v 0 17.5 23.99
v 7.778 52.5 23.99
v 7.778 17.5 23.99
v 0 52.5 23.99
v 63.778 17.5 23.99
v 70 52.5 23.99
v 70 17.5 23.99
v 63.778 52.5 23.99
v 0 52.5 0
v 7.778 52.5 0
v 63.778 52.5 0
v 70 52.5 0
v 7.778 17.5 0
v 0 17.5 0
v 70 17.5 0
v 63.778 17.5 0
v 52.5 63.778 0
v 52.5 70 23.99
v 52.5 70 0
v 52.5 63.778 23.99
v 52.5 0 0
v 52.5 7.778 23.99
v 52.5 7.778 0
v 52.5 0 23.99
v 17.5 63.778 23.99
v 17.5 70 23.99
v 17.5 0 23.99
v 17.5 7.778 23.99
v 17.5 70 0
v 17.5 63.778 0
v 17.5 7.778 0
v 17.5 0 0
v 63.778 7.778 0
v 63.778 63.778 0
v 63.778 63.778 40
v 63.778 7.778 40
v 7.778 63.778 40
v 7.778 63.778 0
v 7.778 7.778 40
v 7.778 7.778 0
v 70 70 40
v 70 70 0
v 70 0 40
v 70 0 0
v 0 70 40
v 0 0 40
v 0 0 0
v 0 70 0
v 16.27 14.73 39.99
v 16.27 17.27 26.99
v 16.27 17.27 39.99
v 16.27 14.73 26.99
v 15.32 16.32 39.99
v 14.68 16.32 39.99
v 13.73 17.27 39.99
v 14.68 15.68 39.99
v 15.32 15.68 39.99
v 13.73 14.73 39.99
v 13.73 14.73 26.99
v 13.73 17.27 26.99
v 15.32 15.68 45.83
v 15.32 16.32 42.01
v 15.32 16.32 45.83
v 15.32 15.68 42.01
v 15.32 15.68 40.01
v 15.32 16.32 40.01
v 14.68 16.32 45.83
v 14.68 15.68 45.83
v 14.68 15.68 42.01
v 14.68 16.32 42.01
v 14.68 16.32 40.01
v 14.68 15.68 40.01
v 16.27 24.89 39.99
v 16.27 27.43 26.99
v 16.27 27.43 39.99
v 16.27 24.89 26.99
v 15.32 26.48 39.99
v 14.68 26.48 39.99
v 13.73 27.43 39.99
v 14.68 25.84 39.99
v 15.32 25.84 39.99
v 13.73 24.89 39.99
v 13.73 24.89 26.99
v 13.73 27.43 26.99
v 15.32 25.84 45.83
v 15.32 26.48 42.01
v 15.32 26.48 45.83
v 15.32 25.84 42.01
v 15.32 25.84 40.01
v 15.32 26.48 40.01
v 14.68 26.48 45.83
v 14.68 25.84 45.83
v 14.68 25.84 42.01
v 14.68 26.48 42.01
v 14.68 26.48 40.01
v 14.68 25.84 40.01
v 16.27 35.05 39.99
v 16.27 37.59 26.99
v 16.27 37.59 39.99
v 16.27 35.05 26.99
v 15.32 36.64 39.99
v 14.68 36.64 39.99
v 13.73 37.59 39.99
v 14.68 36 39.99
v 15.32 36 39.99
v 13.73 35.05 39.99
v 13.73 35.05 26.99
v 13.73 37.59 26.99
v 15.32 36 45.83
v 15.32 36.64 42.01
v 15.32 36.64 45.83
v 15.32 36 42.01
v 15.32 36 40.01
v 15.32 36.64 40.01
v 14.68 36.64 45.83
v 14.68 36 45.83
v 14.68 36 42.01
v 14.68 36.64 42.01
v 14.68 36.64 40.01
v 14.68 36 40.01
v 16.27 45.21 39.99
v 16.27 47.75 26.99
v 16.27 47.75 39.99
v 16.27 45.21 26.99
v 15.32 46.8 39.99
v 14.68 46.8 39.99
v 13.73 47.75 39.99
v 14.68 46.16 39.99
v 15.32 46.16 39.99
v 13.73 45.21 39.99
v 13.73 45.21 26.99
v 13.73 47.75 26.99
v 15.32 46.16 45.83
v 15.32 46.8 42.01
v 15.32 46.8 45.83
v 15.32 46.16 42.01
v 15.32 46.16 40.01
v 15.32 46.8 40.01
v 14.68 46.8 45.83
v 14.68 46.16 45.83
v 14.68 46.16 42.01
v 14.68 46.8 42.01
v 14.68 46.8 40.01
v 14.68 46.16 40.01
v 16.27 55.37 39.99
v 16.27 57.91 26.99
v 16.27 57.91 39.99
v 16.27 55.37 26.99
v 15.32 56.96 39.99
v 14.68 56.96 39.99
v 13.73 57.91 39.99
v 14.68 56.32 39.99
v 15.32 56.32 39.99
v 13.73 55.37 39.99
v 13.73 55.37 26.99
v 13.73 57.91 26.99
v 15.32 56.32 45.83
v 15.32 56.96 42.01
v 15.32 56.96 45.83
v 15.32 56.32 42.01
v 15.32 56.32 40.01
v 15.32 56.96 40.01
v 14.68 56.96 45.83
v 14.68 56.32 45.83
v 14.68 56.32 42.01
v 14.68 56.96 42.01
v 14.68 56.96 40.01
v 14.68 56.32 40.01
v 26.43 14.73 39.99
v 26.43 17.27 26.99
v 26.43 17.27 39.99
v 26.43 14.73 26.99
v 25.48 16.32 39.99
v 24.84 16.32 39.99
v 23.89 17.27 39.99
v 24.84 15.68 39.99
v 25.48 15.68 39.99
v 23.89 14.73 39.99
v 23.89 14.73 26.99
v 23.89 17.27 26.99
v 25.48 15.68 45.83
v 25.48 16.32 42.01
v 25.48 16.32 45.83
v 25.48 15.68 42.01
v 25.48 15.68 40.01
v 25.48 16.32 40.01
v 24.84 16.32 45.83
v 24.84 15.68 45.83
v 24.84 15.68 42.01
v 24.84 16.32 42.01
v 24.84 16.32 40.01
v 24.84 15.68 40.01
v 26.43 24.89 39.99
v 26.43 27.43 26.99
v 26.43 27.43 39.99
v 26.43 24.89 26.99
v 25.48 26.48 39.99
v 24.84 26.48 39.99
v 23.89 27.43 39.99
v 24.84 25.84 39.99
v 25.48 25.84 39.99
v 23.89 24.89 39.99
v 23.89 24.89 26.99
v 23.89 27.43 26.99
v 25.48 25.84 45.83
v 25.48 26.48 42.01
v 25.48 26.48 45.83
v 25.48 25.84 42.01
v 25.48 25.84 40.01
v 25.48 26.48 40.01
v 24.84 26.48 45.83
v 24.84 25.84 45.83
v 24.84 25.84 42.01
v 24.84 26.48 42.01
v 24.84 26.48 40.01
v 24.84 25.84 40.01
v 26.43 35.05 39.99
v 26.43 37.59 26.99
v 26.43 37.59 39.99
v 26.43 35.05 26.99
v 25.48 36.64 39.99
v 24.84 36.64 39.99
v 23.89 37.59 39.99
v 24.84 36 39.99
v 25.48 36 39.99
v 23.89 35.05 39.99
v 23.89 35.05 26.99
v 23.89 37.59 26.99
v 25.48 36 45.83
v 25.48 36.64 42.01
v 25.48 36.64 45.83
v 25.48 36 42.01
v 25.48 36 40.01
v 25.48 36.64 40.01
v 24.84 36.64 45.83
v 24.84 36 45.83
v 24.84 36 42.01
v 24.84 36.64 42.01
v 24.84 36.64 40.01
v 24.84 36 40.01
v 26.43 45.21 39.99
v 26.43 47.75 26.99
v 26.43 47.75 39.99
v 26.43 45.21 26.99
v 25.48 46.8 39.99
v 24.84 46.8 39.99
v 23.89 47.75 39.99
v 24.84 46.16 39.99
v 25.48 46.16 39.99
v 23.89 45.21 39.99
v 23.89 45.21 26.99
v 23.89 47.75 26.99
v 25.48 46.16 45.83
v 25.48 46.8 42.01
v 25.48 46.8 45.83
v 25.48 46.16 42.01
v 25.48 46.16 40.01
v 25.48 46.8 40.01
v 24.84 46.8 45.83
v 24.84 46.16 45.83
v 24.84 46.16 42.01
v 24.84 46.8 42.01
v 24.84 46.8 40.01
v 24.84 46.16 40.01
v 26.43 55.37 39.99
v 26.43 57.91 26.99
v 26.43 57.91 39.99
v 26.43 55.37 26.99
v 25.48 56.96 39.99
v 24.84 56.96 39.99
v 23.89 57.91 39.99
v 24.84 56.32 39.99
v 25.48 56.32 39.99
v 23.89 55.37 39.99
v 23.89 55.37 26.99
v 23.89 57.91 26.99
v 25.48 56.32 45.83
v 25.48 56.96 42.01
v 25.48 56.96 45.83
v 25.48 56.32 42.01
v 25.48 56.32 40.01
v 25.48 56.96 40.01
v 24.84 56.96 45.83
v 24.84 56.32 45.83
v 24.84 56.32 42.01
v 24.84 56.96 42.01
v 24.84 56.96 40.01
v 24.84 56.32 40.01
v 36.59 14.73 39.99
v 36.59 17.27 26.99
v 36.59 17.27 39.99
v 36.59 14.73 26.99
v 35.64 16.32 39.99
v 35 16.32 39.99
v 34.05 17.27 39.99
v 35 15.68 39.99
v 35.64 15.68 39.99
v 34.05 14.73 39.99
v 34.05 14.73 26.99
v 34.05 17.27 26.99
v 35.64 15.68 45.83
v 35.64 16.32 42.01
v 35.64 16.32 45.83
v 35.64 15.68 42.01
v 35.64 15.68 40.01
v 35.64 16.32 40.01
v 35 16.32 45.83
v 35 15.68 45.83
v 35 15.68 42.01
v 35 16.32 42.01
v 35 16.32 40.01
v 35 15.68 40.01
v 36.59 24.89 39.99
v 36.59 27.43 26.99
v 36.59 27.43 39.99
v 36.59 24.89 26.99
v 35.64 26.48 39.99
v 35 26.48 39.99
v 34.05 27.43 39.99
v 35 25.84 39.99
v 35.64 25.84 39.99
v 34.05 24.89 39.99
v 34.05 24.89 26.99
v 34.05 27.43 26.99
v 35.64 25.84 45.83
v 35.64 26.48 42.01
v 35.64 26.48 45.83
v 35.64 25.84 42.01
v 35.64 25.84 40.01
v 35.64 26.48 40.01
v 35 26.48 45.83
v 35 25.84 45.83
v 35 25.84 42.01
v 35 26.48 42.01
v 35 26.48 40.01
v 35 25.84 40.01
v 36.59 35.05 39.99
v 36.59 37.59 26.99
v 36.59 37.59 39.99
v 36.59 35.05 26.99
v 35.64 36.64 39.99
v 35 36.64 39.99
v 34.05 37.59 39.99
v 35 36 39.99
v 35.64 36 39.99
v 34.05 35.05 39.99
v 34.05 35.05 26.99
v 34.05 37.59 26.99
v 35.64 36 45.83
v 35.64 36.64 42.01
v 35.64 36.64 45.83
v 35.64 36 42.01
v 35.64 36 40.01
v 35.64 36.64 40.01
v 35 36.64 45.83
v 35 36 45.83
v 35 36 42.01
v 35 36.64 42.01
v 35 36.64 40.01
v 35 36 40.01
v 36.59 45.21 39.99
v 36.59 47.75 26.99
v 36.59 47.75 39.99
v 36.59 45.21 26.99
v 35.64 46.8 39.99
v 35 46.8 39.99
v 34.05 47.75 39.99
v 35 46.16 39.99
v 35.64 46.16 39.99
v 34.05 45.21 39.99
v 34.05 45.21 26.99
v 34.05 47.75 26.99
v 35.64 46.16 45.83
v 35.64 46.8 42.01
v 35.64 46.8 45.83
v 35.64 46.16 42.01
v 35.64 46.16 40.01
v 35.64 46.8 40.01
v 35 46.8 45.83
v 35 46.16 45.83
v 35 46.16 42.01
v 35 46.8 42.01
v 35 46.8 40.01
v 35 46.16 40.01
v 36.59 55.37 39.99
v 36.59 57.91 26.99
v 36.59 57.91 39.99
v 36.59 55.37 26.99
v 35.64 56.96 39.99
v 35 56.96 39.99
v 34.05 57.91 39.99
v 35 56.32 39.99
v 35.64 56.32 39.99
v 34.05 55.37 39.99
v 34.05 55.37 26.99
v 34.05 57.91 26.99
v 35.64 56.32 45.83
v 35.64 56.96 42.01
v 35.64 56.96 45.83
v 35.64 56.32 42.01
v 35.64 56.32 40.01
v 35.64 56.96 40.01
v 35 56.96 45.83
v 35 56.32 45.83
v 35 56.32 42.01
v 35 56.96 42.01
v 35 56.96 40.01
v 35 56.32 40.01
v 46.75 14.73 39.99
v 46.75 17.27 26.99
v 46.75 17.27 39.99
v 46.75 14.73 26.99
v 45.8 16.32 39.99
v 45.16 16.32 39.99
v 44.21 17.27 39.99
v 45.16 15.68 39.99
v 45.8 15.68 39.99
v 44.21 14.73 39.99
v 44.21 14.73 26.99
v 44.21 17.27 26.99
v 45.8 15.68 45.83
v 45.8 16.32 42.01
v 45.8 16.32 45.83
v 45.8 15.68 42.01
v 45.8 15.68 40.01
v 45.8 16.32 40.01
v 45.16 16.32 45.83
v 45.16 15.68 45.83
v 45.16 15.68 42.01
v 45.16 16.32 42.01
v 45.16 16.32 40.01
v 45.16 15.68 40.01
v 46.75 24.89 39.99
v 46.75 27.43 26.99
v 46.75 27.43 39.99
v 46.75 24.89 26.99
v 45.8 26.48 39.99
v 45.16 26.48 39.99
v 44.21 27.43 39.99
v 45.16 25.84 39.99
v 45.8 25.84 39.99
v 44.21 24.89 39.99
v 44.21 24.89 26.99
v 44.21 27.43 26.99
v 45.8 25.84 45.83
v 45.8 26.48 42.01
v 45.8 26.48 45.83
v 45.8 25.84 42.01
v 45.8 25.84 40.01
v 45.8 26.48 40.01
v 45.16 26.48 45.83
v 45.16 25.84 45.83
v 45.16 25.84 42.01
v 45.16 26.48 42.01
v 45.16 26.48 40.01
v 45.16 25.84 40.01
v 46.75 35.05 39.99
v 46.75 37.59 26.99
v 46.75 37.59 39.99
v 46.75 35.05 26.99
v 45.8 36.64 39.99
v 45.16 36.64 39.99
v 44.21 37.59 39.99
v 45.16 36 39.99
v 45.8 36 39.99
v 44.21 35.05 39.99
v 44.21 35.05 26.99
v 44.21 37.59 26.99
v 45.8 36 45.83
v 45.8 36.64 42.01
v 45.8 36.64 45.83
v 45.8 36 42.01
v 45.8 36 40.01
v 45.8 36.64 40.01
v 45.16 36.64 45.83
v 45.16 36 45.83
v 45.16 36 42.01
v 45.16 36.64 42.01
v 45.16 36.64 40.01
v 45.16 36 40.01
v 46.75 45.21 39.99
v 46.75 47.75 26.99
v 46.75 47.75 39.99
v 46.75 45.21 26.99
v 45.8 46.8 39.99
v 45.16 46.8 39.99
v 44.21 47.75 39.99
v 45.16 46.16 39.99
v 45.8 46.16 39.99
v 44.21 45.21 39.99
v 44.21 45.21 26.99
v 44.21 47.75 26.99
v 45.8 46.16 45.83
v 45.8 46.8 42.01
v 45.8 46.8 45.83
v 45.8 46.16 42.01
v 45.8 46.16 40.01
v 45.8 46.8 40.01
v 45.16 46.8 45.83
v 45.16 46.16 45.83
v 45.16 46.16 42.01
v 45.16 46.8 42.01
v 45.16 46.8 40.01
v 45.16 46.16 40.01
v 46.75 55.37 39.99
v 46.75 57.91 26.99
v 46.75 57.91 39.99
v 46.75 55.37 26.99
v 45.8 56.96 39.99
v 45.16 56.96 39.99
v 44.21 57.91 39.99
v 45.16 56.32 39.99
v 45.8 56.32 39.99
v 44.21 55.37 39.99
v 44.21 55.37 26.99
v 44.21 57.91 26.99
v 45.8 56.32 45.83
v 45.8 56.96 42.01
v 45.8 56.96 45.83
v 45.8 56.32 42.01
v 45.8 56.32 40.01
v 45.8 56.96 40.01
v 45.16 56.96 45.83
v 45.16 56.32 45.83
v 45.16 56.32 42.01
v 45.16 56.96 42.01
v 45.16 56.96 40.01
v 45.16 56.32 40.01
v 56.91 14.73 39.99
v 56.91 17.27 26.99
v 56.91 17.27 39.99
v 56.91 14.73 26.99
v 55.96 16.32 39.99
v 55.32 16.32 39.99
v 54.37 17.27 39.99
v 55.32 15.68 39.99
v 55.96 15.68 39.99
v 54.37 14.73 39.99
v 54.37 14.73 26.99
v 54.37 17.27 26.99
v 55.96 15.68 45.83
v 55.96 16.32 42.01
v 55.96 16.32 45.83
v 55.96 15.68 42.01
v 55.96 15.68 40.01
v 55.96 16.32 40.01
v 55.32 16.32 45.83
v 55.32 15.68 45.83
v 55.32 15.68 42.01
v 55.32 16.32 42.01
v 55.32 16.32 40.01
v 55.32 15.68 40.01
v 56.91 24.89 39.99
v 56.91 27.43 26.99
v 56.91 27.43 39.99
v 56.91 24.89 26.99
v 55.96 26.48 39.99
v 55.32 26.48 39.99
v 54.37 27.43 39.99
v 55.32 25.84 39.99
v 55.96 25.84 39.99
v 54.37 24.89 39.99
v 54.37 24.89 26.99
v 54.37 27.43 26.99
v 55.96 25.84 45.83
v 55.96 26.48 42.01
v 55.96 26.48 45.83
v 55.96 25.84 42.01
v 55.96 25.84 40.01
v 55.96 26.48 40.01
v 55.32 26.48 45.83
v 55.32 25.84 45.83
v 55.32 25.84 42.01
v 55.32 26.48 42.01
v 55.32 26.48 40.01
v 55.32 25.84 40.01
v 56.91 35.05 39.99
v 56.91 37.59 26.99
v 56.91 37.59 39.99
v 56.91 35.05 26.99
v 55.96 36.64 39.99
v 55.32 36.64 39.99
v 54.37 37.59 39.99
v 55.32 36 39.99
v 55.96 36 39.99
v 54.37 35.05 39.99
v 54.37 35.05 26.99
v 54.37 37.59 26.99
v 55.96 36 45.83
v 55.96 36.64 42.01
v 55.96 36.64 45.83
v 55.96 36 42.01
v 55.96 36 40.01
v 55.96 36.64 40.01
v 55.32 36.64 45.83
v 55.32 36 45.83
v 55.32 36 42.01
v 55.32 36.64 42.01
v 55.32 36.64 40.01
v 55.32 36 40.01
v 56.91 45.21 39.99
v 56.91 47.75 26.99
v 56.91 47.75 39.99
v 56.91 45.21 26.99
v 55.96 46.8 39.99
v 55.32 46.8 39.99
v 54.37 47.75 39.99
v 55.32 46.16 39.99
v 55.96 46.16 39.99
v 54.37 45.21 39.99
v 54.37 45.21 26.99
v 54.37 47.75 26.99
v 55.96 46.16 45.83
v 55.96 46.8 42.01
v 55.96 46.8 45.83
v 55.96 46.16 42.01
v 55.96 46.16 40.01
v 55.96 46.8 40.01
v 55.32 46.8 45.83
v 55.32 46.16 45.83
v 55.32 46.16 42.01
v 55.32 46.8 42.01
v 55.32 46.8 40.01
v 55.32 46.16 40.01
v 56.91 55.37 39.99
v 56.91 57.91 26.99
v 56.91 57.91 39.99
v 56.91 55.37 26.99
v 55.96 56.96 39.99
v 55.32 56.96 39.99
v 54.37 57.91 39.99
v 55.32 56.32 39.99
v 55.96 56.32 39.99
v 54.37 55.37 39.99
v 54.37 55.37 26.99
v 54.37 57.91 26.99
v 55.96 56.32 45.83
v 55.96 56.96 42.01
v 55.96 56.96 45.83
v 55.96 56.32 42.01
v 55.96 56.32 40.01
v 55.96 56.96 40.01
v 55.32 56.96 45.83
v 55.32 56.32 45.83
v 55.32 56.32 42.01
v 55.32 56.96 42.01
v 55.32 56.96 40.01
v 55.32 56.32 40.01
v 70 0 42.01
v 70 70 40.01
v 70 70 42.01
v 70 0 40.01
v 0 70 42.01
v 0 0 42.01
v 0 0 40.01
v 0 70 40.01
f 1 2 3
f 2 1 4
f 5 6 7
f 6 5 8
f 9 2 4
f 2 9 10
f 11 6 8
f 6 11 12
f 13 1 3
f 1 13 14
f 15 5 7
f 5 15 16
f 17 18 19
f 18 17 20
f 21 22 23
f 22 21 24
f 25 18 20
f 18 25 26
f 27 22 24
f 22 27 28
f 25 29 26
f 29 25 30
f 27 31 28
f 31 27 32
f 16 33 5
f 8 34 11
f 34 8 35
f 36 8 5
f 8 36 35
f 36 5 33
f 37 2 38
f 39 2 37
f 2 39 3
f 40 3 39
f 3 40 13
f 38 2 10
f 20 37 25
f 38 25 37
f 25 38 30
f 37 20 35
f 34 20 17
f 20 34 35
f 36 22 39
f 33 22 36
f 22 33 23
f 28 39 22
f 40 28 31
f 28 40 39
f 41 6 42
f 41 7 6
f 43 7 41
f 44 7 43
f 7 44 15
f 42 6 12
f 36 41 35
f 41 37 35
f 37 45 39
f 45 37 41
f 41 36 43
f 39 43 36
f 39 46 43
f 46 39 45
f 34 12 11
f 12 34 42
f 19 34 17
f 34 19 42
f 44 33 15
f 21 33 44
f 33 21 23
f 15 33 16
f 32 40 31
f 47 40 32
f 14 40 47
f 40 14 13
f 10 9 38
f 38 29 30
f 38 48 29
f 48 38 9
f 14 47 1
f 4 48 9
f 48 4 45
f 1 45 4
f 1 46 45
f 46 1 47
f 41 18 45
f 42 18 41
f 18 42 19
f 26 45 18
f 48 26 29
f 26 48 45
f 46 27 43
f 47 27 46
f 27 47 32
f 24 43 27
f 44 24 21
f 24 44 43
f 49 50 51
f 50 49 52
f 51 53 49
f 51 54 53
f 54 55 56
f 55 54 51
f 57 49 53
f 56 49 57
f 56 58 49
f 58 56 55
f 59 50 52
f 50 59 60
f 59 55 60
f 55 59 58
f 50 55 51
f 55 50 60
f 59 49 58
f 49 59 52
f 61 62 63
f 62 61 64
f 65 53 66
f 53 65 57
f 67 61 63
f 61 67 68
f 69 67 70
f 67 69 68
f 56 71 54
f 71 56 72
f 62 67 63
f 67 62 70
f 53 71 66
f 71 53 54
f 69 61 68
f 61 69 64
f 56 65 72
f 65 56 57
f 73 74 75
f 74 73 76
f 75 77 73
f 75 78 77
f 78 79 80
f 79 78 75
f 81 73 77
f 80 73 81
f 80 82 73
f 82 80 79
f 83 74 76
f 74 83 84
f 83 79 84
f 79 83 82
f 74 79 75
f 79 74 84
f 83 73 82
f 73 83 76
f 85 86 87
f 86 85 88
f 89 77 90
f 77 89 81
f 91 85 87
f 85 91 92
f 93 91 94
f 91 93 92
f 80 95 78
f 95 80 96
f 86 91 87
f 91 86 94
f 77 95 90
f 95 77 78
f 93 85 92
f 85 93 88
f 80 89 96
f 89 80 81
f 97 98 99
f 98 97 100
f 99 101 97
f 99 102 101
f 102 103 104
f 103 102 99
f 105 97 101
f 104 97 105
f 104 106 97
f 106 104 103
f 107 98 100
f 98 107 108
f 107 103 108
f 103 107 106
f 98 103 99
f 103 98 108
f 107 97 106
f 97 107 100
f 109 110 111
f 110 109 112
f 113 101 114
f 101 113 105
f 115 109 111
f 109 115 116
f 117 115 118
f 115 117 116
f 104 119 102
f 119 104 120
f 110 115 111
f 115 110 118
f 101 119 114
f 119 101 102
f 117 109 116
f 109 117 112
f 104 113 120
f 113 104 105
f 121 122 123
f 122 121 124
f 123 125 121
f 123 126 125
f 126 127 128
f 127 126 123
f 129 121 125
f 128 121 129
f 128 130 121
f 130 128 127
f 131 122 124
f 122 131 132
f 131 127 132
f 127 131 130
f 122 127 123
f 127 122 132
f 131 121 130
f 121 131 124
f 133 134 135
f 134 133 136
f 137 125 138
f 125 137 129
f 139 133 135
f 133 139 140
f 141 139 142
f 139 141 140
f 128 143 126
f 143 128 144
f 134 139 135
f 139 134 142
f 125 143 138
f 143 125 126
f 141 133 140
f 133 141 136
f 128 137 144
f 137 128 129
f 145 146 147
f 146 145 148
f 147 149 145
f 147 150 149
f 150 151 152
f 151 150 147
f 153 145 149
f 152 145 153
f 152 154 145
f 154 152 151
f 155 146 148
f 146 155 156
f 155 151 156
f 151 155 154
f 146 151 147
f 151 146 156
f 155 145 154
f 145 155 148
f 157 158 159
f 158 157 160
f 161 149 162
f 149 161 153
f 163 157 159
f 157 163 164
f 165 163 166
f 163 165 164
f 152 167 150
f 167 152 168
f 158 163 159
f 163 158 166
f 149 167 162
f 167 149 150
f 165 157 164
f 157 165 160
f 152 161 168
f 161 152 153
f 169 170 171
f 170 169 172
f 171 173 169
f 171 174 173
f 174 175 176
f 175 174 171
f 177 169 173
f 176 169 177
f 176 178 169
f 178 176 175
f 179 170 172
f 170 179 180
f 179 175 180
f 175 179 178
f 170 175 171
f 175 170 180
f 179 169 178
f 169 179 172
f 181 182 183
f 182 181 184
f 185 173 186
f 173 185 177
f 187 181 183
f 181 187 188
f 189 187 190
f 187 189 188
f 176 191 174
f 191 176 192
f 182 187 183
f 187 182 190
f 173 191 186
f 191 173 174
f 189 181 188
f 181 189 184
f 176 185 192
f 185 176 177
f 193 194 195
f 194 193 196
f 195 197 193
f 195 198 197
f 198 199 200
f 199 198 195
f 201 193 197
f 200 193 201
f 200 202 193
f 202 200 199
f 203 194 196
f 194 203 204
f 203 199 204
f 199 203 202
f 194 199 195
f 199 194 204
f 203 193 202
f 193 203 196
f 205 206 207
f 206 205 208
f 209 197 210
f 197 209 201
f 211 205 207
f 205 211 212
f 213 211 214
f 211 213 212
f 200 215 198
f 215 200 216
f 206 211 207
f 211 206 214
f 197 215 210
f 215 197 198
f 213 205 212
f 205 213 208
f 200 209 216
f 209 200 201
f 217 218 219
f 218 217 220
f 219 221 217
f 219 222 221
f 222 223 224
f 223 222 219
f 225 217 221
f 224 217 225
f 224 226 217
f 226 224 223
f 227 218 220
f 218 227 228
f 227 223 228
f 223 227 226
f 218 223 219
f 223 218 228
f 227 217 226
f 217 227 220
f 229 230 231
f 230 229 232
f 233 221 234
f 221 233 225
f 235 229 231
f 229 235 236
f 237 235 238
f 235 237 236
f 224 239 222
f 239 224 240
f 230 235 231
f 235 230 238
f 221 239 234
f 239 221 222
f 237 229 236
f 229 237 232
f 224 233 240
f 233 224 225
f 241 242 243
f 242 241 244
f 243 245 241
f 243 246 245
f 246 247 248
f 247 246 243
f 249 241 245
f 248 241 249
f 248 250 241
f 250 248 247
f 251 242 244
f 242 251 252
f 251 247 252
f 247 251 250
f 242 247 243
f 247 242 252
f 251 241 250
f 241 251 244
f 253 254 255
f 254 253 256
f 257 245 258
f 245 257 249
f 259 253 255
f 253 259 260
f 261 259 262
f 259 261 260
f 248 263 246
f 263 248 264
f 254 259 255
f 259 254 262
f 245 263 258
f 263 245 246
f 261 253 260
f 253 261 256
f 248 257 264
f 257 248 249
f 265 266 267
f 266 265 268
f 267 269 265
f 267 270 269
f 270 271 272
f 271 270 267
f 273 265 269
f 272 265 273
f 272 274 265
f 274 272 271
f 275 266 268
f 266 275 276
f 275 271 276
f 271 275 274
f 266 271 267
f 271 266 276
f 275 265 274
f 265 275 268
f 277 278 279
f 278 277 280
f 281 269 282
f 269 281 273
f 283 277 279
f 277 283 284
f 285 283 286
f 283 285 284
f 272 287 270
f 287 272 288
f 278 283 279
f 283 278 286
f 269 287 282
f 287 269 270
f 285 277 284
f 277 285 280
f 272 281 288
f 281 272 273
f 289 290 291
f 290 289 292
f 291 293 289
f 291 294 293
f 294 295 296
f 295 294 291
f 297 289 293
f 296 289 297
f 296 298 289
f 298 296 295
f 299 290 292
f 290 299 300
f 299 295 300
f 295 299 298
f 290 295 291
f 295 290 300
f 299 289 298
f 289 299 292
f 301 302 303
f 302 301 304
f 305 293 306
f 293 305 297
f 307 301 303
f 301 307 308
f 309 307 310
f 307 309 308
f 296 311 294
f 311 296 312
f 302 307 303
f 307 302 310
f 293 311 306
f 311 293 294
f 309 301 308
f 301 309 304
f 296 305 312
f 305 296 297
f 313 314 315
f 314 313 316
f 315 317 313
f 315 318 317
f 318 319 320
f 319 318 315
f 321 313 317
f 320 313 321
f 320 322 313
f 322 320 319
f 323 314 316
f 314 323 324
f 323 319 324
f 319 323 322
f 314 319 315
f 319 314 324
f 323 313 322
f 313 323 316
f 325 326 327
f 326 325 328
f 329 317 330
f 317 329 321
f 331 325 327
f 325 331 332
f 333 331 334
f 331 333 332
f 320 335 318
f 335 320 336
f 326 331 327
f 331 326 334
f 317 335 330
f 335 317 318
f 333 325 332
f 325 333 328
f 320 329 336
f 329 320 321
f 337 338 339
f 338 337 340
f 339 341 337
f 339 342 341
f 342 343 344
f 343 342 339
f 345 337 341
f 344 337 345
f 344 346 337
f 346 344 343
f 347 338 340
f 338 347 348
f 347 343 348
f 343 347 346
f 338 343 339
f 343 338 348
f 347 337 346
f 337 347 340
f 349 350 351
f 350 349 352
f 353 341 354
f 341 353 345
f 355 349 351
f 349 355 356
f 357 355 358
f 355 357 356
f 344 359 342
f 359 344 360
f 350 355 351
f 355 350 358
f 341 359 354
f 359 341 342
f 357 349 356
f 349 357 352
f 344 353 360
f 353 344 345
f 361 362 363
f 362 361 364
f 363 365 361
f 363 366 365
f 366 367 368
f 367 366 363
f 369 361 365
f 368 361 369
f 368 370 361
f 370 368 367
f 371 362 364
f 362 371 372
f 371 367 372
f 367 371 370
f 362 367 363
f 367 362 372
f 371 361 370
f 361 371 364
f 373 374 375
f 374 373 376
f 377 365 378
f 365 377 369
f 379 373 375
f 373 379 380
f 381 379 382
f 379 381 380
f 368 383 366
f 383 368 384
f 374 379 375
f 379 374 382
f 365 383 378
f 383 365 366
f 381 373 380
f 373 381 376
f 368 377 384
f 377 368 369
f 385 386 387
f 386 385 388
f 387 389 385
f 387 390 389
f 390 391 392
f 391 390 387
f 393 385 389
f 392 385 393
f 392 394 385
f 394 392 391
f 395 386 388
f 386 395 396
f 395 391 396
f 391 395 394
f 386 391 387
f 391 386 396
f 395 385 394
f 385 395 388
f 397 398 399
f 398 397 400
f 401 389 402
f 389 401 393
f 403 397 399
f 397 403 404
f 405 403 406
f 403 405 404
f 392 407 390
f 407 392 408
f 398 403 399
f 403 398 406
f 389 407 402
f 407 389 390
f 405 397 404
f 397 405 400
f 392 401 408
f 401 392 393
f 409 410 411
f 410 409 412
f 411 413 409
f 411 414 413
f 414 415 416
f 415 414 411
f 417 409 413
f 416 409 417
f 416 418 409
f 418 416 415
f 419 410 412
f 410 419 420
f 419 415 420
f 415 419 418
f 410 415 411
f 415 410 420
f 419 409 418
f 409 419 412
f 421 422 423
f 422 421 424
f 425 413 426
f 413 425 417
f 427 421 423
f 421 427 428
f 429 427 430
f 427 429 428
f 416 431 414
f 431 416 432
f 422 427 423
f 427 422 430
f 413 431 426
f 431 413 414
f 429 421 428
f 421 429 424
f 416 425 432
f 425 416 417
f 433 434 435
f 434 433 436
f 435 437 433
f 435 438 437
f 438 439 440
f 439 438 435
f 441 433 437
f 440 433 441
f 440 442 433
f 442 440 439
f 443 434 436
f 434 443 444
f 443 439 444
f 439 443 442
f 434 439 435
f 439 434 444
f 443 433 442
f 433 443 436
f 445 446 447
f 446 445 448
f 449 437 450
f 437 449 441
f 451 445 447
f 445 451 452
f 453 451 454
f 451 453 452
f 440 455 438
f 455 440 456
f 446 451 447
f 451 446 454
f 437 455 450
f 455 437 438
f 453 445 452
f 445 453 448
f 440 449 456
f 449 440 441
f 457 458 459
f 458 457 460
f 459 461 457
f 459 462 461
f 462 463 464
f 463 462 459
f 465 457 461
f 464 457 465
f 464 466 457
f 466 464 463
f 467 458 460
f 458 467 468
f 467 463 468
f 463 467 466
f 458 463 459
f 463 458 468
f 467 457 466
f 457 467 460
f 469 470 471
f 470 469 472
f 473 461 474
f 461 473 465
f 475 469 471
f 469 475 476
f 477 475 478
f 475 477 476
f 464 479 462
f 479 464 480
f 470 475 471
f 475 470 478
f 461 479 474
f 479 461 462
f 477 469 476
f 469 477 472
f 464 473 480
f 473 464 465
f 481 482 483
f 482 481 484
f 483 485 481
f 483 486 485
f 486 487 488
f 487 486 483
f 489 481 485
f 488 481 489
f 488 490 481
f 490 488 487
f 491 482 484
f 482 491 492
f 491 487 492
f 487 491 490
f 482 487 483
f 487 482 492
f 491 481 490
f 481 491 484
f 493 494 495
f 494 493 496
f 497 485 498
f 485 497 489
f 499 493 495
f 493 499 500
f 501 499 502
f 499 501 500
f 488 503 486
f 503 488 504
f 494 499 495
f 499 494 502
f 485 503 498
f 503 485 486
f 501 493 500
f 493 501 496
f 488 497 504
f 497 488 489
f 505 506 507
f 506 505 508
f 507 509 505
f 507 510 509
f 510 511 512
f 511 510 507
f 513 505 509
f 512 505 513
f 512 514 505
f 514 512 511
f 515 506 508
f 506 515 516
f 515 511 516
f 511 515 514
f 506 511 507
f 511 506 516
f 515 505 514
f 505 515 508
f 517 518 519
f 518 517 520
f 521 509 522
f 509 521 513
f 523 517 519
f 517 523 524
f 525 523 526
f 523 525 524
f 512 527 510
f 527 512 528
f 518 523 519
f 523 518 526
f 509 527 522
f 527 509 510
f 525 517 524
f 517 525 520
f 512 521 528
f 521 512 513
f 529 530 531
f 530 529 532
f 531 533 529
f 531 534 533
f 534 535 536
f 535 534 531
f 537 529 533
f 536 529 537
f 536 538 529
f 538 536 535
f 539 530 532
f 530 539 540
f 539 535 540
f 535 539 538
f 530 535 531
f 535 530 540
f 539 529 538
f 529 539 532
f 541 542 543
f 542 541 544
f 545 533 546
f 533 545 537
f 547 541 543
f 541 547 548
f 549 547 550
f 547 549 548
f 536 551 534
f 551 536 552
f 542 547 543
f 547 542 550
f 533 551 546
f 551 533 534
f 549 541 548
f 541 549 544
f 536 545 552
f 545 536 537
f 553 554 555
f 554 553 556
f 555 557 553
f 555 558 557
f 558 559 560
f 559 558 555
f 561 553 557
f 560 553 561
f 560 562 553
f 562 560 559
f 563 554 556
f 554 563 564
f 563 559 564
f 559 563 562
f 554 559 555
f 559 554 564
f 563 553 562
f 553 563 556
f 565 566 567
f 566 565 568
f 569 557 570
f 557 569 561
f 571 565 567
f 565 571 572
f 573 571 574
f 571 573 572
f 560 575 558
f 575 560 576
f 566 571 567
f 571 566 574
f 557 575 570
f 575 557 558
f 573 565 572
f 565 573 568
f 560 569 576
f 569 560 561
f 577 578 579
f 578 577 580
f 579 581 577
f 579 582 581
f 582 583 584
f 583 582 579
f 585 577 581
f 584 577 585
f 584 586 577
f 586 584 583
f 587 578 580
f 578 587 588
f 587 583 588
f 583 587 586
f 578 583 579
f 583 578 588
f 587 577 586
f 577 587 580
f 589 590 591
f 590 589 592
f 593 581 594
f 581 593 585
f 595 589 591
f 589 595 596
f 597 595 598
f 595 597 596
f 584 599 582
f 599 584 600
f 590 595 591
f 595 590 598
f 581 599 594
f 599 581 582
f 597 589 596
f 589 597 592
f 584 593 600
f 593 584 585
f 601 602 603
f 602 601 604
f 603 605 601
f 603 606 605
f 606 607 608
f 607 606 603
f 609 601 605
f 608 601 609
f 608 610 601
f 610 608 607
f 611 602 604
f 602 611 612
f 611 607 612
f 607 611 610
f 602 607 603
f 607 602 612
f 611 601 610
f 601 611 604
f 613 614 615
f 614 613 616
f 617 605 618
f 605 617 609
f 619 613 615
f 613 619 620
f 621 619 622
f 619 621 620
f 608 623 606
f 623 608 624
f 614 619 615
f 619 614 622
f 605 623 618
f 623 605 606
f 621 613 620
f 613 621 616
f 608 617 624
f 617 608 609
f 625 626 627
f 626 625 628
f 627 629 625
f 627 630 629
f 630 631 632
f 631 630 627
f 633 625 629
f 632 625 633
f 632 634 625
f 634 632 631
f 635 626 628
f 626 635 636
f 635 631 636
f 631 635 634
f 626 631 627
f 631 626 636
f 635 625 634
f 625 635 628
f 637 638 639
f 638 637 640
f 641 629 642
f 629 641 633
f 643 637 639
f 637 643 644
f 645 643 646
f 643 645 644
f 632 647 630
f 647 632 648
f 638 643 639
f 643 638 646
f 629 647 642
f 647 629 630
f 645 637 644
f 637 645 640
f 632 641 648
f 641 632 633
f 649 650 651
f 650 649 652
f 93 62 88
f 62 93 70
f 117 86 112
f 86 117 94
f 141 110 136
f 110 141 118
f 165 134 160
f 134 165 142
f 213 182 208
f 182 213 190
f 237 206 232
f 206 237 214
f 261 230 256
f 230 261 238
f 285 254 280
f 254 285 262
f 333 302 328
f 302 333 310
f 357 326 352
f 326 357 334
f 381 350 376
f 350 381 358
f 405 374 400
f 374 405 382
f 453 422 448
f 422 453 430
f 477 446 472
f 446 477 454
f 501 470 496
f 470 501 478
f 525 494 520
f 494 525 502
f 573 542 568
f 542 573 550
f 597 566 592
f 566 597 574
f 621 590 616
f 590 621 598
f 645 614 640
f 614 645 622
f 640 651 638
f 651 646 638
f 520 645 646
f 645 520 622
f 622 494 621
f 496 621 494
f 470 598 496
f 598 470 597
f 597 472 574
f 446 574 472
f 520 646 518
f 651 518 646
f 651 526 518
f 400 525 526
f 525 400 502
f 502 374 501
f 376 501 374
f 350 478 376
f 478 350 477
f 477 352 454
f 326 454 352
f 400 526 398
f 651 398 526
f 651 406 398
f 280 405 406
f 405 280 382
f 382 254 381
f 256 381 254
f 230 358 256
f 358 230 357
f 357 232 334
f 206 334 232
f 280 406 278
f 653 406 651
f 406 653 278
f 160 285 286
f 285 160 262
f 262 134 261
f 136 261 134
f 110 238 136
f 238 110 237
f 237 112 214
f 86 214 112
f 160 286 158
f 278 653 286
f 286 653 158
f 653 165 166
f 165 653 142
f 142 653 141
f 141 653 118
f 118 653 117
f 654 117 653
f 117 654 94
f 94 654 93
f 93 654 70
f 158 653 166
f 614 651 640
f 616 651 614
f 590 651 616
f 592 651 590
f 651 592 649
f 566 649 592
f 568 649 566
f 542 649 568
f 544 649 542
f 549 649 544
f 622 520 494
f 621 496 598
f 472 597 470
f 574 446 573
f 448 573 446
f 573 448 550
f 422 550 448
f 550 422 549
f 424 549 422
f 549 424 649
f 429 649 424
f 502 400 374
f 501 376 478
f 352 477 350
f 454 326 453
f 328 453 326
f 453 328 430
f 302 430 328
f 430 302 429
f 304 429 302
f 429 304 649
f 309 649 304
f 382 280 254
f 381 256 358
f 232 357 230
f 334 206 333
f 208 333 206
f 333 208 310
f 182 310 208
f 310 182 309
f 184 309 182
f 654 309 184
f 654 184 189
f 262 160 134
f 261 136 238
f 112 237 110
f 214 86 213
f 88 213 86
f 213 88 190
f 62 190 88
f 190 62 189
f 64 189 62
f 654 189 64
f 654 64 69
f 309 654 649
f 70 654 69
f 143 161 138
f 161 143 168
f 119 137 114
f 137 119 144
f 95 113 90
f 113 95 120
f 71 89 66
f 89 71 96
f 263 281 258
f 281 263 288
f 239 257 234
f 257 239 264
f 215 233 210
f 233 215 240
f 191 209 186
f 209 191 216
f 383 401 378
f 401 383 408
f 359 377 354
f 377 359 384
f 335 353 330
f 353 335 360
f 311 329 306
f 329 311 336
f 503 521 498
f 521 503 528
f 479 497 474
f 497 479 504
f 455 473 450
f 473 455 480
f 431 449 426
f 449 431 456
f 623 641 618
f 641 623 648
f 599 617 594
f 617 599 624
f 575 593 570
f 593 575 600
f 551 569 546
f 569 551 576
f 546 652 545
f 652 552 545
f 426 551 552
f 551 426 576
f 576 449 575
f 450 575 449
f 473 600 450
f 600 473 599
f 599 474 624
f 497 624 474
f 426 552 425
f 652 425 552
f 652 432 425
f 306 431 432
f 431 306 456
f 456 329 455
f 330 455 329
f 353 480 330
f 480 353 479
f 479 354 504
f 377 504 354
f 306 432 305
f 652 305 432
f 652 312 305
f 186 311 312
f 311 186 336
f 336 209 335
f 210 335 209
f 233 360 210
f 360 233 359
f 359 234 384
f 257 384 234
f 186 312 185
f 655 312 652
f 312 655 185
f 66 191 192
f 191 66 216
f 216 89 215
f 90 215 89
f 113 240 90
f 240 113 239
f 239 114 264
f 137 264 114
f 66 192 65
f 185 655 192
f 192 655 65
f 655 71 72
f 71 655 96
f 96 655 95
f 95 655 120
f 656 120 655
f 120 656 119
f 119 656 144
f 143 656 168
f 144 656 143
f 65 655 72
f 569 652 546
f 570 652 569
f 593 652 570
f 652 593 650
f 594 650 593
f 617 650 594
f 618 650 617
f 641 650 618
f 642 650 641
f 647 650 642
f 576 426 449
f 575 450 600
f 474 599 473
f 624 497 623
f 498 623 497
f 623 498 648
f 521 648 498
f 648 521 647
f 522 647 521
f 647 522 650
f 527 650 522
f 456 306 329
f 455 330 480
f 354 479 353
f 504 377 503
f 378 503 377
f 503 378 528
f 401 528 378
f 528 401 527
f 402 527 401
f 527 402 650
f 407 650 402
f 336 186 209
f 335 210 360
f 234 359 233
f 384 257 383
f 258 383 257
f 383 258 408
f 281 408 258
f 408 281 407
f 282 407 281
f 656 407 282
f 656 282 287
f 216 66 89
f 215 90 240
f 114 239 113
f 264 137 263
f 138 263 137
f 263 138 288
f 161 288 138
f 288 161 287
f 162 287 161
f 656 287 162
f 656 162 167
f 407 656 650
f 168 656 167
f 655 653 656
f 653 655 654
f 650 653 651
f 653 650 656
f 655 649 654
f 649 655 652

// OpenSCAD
/*  _____ ___    _    __  __    ____    _    ____    */
/* |  ___/ _ \  / \  |  \/  |  / ___|  / \  |  _ \  */
/* | |_ | | | |/ _ \ | |\/| | | |     / _ \ | | | | */
/* |  _|| |_| / ___ \| |  | | | |___ / ___ \| |_| | */
/* |_|   \___/_/   \_\_|  |_|  \____/_/   \_\____/  */

h = 40;
w = 70;
d = 70;

table(w,d,h);

translate([15,15,h-13.01])
    pin_array(5,5,4);
translate([0,0,h+0.01])
color("DarkGreen",0.5)
cube([w,d,2]);


module table(width,depth, hegiht)
{
    difference()
    {
        color("DarkOrange",1.0)
            cube([width,depth,hegiht]);
        union()
        {
            color("DarkOrange",1.0)
            {
                translate([-width/4,depth/4,-0.01])
                    cube([width*1.6,depth*0.5,hegiht*0.6]);
                translate([width/4,-depth/4,-0.01])
                    cube([width*0.5,depth*1.6,hegiht*0.6]);
                translate([width/9,depth/9,-0.06])
                    cube([width*0.8,depth*0.8,hegiht*0.6]);
                translate([width/9,depth/9,-0.06])
                    cube([width*0.8,depth*0.8,hegiht*2]);
            }

        }
    }
}

module pin_array(xcount,ycount,skip)
{
    pin_width=2.54; //mm
    nr_of_pins_in_x = xcount;
    nr_of_pins_in_y = ycount;
    pin_jumps = skip;

    inc= pin_width * pin_jumps;
    for (xpin = [0:inc:inc*nr_of_pins_in_x-1])
    {
        for (ypin = [1:inc:inc*nr_of_pins_in_y-1])
        {
            pin(xpin,ypin,0);
            //echo(xpin,ypin);
        }
    }
}

module pin(x,y,z)
{
    pin_width=2.54; //mm
    height = 13;
    translate([x,y,z])
        translate([-pin_width/2,-pin_width/2,0])
        {
            cube([pin_width,pin_width,height]);
            color([0.8,0.8,0])
                translate([pin_width/2-0.64/2,pin_width/2-0.64/2,height])
                cube([0.64,0.64,5.84]);
        }
}
